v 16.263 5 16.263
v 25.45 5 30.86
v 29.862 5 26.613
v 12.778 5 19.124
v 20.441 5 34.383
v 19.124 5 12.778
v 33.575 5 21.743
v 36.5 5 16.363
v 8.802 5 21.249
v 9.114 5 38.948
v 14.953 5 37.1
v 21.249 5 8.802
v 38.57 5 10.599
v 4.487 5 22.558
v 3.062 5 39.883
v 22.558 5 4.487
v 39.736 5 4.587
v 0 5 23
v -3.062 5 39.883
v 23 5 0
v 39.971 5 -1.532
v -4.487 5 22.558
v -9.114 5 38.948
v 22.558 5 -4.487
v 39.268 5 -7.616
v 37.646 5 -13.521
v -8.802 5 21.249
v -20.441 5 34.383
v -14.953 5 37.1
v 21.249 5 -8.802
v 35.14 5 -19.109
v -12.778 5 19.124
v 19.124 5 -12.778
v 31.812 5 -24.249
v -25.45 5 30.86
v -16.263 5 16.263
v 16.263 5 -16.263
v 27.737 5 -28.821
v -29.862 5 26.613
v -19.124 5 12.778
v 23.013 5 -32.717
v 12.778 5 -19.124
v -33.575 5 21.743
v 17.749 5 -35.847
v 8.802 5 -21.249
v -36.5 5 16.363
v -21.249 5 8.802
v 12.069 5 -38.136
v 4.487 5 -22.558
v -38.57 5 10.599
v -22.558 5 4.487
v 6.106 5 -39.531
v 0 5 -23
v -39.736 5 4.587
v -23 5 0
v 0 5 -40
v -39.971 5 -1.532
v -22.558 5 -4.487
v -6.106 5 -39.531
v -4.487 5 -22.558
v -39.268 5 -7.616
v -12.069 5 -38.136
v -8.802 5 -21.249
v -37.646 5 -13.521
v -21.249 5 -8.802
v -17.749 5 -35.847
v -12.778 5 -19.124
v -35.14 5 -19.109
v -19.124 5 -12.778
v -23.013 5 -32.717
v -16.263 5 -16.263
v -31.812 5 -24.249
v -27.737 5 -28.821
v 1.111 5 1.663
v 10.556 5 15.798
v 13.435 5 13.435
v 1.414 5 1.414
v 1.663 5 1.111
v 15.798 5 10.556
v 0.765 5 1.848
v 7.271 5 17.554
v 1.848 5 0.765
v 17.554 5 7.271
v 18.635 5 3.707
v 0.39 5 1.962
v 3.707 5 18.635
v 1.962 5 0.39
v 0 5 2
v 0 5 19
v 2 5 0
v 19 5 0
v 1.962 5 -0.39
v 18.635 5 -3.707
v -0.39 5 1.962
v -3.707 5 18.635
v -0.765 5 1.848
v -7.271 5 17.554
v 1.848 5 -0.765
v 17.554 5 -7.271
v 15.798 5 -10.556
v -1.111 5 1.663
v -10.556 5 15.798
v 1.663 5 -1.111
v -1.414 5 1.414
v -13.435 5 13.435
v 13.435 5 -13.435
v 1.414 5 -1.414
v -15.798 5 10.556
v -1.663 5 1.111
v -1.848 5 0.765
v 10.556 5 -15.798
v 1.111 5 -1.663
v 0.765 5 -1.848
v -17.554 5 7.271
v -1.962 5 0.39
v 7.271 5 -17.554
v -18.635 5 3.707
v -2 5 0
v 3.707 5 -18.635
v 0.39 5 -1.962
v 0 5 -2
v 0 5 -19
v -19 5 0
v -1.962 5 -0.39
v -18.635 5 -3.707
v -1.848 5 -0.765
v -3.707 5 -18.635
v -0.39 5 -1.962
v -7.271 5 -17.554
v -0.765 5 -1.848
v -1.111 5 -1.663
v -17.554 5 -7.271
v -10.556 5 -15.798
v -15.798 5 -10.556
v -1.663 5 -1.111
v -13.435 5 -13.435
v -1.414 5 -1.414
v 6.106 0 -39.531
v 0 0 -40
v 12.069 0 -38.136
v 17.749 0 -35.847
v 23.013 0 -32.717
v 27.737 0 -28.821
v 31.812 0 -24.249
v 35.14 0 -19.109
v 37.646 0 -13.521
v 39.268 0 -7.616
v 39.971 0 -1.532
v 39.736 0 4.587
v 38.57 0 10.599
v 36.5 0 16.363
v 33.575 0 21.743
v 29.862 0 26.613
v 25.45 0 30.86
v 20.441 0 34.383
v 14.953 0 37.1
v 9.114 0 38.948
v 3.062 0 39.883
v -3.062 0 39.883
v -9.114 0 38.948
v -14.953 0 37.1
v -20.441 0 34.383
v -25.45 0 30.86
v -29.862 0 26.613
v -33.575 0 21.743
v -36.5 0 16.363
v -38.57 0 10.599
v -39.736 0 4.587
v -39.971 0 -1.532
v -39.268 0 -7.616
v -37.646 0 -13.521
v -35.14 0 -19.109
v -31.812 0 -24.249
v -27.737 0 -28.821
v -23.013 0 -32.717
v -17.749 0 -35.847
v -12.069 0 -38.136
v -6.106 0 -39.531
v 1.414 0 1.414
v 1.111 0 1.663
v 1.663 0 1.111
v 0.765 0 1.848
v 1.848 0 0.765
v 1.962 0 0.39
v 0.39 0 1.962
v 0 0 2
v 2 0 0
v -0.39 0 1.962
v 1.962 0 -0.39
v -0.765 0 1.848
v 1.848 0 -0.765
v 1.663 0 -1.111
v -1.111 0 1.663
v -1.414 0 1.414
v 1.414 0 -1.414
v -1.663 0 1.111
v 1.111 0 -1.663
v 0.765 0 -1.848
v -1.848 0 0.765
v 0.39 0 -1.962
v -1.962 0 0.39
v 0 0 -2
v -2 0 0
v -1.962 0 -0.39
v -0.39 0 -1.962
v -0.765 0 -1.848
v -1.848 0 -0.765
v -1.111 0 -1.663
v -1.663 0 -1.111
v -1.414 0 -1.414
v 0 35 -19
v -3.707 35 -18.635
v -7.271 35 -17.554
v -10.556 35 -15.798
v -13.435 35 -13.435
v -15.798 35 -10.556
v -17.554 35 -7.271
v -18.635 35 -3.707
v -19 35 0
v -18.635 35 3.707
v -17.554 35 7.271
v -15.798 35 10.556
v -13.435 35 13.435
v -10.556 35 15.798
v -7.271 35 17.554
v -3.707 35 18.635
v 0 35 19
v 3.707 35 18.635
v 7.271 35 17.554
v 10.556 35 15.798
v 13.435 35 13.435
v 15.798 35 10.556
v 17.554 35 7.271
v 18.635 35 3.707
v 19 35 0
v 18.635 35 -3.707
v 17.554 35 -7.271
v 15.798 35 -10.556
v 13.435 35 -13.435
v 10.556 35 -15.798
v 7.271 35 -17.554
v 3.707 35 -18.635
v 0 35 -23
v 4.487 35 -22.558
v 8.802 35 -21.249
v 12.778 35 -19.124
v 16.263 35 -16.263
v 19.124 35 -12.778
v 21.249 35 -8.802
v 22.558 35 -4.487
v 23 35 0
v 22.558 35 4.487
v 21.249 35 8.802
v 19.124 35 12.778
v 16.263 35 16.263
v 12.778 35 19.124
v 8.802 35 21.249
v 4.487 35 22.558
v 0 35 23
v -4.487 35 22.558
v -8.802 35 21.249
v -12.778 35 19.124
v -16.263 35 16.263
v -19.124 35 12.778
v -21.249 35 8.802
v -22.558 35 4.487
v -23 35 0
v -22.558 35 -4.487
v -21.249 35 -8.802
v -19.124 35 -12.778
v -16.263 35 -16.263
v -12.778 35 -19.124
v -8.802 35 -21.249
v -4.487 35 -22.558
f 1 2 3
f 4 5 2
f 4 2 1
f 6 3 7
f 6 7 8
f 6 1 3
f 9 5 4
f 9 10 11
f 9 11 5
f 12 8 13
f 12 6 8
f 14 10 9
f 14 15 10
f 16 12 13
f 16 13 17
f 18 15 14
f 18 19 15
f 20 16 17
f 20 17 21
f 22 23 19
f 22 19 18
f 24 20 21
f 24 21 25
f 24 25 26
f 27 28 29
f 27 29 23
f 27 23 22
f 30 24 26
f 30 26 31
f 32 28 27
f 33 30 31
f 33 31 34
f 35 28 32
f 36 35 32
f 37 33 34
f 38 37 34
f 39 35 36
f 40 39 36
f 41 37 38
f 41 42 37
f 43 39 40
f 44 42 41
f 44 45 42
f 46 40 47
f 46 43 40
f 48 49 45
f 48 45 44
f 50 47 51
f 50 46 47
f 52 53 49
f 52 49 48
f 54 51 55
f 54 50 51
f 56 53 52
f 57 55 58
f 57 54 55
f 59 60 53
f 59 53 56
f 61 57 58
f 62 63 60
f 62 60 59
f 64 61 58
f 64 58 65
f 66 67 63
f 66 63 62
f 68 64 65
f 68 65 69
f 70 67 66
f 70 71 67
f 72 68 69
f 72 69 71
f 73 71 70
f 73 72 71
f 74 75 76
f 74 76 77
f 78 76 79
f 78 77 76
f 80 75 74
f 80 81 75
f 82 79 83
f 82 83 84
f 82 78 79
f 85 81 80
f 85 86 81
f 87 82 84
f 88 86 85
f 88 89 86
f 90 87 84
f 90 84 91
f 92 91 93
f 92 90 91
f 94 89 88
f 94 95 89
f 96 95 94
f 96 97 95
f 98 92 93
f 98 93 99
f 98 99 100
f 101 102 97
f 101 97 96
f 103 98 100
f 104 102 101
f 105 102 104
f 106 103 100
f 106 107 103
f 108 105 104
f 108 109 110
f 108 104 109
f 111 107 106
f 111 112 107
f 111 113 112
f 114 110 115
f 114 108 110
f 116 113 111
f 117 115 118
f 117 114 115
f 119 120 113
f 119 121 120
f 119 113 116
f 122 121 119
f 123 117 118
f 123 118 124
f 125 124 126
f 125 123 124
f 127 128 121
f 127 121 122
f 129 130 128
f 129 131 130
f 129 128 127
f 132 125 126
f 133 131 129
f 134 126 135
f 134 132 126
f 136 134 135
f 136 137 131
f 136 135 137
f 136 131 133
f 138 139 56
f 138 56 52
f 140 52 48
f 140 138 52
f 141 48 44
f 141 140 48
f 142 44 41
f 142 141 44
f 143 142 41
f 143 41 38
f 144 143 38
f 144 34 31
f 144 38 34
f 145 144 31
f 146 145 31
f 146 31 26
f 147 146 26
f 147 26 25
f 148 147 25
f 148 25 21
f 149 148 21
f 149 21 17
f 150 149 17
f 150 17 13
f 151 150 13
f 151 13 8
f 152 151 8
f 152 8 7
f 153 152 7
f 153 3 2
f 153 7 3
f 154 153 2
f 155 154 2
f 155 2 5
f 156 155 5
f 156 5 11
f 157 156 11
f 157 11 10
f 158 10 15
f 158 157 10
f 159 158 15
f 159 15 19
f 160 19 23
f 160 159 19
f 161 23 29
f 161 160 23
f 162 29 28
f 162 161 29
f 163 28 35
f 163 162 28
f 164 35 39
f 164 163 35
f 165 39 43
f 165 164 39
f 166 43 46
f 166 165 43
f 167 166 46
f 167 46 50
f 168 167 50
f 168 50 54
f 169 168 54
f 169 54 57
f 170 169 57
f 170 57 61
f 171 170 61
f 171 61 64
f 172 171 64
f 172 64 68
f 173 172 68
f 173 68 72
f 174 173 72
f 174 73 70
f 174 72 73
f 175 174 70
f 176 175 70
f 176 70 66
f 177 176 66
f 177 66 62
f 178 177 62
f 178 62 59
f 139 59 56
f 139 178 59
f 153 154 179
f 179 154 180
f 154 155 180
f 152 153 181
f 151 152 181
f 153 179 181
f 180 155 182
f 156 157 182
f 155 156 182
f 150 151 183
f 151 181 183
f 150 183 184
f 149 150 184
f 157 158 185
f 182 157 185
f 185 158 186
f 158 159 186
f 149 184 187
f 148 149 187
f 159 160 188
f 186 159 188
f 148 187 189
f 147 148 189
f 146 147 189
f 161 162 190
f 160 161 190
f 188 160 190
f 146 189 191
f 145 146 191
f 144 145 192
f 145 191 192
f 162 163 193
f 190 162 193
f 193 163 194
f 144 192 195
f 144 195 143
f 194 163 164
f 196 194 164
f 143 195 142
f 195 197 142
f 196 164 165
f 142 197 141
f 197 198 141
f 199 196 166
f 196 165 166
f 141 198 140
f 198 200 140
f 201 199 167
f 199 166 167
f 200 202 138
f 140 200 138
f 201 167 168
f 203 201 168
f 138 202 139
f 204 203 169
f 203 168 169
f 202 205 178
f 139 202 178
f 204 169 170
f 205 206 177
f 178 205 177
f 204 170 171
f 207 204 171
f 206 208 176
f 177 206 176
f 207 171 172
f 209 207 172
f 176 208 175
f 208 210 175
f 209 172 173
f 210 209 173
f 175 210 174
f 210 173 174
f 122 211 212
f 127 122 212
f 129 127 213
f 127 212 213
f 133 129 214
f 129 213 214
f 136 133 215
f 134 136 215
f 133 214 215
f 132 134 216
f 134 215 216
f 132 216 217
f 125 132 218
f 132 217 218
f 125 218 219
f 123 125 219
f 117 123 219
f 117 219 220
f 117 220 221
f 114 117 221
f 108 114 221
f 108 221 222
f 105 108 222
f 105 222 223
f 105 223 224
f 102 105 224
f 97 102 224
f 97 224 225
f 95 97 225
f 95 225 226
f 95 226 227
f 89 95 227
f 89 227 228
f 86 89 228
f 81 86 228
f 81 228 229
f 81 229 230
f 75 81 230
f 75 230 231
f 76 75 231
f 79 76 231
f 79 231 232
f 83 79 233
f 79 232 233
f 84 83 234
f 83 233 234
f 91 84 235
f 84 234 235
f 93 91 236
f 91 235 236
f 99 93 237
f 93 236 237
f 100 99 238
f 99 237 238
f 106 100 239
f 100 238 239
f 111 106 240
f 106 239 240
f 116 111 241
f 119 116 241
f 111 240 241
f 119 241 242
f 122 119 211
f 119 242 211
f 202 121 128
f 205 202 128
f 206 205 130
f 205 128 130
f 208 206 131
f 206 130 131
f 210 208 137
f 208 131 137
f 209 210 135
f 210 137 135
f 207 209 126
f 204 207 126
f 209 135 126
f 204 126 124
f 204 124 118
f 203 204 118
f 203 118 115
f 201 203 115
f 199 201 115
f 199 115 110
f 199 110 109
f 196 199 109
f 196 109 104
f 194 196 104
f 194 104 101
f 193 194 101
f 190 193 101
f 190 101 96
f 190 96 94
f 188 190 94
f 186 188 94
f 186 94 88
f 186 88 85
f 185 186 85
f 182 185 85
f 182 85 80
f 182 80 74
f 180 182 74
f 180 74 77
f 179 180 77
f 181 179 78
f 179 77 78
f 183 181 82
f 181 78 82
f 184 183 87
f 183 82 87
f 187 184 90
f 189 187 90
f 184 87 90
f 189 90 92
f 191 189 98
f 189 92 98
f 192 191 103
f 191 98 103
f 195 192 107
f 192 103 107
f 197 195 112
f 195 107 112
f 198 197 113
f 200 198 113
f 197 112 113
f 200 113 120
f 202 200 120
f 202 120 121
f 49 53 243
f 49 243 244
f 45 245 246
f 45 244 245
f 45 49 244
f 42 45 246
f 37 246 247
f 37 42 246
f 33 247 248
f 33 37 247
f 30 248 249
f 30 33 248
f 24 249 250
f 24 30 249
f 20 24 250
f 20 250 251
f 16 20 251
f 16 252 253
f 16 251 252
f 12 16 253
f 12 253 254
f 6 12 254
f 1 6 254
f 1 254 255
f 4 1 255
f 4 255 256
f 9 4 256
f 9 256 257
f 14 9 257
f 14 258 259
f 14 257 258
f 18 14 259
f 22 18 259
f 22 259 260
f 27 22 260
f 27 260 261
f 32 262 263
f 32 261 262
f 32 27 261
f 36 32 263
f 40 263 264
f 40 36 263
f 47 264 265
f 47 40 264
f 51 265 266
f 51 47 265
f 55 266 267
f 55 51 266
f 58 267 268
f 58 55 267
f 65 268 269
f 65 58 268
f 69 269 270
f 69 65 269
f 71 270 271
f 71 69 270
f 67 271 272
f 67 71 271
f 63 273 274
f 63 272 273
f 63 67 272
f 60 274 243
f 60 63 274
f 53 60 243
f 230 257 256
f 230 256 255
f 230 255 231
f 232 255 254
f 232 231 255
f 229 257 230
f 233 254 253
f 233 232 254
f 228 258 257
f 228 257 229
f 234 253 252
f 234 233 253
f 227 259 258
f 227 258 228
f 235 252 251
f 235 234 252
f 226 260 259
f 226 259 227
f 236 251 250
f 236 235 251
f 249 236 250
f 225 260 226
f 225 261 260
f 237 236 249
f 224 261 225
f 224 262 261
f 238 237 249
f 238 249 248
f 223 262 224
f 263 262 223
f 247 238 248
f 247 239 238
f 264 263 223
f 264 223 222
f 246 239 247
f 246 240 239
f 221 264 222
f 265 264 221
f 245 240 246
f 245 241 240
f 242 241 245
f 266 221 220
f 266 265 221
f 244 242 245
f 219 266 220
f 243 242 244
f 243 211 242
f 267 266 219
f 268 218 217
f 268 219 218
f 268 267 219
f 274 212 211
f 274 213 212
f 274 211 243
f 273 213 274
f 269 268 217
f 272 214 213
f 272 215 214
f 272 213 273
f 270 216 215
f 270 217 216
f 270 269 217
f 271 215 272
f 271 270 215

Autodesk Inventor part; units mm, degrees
ref_plane "YZ Plane" through (0, 0, 0) normal (1, 0, 0) x (0, 1, 0)
ref_plane "XZ Plane" through (0, 0, 0) normal (0, 1, 0) x (-1, 0, 0)
ref_plane "XY Plane" through (0, 0, 0) normal (0, 0, 1) x (1, 0, 0)
sketch "Sketch1" plane through (0, 0, 0) normal (1, 0, 0) x (0, 1, 0)
  line L0 (0, -2) -> (5, -2)
  line L1 (5, -2) -> (5, -19)
  line L2 (5, -19) -> (35, -19)
  line L3 (35, -19) -> (35, -23)
  line L4 (35, -23) -> (5, -23)
  line L5 (5, -23) -> (5, -40)
  line L6 (5, -40) -> (0, -40)
  line L7 (0, -40) -> (0, -2)
  line L8 (-7, 0) -> (42, 0) projected
  point P0 (0, 0)
  dimension "d0" = 35
  dimension "d1" = 2
  dimension "d2" = 5
  dimension "d3" = 19
  dimension "d4" = 23
  dimension "d5" = 40
revolve "Revolution1" add sketch "Sketch1" angle 360 about axis through (0, -10, 0) along (0, 1, 0)
properties material "ABS Plastic"
